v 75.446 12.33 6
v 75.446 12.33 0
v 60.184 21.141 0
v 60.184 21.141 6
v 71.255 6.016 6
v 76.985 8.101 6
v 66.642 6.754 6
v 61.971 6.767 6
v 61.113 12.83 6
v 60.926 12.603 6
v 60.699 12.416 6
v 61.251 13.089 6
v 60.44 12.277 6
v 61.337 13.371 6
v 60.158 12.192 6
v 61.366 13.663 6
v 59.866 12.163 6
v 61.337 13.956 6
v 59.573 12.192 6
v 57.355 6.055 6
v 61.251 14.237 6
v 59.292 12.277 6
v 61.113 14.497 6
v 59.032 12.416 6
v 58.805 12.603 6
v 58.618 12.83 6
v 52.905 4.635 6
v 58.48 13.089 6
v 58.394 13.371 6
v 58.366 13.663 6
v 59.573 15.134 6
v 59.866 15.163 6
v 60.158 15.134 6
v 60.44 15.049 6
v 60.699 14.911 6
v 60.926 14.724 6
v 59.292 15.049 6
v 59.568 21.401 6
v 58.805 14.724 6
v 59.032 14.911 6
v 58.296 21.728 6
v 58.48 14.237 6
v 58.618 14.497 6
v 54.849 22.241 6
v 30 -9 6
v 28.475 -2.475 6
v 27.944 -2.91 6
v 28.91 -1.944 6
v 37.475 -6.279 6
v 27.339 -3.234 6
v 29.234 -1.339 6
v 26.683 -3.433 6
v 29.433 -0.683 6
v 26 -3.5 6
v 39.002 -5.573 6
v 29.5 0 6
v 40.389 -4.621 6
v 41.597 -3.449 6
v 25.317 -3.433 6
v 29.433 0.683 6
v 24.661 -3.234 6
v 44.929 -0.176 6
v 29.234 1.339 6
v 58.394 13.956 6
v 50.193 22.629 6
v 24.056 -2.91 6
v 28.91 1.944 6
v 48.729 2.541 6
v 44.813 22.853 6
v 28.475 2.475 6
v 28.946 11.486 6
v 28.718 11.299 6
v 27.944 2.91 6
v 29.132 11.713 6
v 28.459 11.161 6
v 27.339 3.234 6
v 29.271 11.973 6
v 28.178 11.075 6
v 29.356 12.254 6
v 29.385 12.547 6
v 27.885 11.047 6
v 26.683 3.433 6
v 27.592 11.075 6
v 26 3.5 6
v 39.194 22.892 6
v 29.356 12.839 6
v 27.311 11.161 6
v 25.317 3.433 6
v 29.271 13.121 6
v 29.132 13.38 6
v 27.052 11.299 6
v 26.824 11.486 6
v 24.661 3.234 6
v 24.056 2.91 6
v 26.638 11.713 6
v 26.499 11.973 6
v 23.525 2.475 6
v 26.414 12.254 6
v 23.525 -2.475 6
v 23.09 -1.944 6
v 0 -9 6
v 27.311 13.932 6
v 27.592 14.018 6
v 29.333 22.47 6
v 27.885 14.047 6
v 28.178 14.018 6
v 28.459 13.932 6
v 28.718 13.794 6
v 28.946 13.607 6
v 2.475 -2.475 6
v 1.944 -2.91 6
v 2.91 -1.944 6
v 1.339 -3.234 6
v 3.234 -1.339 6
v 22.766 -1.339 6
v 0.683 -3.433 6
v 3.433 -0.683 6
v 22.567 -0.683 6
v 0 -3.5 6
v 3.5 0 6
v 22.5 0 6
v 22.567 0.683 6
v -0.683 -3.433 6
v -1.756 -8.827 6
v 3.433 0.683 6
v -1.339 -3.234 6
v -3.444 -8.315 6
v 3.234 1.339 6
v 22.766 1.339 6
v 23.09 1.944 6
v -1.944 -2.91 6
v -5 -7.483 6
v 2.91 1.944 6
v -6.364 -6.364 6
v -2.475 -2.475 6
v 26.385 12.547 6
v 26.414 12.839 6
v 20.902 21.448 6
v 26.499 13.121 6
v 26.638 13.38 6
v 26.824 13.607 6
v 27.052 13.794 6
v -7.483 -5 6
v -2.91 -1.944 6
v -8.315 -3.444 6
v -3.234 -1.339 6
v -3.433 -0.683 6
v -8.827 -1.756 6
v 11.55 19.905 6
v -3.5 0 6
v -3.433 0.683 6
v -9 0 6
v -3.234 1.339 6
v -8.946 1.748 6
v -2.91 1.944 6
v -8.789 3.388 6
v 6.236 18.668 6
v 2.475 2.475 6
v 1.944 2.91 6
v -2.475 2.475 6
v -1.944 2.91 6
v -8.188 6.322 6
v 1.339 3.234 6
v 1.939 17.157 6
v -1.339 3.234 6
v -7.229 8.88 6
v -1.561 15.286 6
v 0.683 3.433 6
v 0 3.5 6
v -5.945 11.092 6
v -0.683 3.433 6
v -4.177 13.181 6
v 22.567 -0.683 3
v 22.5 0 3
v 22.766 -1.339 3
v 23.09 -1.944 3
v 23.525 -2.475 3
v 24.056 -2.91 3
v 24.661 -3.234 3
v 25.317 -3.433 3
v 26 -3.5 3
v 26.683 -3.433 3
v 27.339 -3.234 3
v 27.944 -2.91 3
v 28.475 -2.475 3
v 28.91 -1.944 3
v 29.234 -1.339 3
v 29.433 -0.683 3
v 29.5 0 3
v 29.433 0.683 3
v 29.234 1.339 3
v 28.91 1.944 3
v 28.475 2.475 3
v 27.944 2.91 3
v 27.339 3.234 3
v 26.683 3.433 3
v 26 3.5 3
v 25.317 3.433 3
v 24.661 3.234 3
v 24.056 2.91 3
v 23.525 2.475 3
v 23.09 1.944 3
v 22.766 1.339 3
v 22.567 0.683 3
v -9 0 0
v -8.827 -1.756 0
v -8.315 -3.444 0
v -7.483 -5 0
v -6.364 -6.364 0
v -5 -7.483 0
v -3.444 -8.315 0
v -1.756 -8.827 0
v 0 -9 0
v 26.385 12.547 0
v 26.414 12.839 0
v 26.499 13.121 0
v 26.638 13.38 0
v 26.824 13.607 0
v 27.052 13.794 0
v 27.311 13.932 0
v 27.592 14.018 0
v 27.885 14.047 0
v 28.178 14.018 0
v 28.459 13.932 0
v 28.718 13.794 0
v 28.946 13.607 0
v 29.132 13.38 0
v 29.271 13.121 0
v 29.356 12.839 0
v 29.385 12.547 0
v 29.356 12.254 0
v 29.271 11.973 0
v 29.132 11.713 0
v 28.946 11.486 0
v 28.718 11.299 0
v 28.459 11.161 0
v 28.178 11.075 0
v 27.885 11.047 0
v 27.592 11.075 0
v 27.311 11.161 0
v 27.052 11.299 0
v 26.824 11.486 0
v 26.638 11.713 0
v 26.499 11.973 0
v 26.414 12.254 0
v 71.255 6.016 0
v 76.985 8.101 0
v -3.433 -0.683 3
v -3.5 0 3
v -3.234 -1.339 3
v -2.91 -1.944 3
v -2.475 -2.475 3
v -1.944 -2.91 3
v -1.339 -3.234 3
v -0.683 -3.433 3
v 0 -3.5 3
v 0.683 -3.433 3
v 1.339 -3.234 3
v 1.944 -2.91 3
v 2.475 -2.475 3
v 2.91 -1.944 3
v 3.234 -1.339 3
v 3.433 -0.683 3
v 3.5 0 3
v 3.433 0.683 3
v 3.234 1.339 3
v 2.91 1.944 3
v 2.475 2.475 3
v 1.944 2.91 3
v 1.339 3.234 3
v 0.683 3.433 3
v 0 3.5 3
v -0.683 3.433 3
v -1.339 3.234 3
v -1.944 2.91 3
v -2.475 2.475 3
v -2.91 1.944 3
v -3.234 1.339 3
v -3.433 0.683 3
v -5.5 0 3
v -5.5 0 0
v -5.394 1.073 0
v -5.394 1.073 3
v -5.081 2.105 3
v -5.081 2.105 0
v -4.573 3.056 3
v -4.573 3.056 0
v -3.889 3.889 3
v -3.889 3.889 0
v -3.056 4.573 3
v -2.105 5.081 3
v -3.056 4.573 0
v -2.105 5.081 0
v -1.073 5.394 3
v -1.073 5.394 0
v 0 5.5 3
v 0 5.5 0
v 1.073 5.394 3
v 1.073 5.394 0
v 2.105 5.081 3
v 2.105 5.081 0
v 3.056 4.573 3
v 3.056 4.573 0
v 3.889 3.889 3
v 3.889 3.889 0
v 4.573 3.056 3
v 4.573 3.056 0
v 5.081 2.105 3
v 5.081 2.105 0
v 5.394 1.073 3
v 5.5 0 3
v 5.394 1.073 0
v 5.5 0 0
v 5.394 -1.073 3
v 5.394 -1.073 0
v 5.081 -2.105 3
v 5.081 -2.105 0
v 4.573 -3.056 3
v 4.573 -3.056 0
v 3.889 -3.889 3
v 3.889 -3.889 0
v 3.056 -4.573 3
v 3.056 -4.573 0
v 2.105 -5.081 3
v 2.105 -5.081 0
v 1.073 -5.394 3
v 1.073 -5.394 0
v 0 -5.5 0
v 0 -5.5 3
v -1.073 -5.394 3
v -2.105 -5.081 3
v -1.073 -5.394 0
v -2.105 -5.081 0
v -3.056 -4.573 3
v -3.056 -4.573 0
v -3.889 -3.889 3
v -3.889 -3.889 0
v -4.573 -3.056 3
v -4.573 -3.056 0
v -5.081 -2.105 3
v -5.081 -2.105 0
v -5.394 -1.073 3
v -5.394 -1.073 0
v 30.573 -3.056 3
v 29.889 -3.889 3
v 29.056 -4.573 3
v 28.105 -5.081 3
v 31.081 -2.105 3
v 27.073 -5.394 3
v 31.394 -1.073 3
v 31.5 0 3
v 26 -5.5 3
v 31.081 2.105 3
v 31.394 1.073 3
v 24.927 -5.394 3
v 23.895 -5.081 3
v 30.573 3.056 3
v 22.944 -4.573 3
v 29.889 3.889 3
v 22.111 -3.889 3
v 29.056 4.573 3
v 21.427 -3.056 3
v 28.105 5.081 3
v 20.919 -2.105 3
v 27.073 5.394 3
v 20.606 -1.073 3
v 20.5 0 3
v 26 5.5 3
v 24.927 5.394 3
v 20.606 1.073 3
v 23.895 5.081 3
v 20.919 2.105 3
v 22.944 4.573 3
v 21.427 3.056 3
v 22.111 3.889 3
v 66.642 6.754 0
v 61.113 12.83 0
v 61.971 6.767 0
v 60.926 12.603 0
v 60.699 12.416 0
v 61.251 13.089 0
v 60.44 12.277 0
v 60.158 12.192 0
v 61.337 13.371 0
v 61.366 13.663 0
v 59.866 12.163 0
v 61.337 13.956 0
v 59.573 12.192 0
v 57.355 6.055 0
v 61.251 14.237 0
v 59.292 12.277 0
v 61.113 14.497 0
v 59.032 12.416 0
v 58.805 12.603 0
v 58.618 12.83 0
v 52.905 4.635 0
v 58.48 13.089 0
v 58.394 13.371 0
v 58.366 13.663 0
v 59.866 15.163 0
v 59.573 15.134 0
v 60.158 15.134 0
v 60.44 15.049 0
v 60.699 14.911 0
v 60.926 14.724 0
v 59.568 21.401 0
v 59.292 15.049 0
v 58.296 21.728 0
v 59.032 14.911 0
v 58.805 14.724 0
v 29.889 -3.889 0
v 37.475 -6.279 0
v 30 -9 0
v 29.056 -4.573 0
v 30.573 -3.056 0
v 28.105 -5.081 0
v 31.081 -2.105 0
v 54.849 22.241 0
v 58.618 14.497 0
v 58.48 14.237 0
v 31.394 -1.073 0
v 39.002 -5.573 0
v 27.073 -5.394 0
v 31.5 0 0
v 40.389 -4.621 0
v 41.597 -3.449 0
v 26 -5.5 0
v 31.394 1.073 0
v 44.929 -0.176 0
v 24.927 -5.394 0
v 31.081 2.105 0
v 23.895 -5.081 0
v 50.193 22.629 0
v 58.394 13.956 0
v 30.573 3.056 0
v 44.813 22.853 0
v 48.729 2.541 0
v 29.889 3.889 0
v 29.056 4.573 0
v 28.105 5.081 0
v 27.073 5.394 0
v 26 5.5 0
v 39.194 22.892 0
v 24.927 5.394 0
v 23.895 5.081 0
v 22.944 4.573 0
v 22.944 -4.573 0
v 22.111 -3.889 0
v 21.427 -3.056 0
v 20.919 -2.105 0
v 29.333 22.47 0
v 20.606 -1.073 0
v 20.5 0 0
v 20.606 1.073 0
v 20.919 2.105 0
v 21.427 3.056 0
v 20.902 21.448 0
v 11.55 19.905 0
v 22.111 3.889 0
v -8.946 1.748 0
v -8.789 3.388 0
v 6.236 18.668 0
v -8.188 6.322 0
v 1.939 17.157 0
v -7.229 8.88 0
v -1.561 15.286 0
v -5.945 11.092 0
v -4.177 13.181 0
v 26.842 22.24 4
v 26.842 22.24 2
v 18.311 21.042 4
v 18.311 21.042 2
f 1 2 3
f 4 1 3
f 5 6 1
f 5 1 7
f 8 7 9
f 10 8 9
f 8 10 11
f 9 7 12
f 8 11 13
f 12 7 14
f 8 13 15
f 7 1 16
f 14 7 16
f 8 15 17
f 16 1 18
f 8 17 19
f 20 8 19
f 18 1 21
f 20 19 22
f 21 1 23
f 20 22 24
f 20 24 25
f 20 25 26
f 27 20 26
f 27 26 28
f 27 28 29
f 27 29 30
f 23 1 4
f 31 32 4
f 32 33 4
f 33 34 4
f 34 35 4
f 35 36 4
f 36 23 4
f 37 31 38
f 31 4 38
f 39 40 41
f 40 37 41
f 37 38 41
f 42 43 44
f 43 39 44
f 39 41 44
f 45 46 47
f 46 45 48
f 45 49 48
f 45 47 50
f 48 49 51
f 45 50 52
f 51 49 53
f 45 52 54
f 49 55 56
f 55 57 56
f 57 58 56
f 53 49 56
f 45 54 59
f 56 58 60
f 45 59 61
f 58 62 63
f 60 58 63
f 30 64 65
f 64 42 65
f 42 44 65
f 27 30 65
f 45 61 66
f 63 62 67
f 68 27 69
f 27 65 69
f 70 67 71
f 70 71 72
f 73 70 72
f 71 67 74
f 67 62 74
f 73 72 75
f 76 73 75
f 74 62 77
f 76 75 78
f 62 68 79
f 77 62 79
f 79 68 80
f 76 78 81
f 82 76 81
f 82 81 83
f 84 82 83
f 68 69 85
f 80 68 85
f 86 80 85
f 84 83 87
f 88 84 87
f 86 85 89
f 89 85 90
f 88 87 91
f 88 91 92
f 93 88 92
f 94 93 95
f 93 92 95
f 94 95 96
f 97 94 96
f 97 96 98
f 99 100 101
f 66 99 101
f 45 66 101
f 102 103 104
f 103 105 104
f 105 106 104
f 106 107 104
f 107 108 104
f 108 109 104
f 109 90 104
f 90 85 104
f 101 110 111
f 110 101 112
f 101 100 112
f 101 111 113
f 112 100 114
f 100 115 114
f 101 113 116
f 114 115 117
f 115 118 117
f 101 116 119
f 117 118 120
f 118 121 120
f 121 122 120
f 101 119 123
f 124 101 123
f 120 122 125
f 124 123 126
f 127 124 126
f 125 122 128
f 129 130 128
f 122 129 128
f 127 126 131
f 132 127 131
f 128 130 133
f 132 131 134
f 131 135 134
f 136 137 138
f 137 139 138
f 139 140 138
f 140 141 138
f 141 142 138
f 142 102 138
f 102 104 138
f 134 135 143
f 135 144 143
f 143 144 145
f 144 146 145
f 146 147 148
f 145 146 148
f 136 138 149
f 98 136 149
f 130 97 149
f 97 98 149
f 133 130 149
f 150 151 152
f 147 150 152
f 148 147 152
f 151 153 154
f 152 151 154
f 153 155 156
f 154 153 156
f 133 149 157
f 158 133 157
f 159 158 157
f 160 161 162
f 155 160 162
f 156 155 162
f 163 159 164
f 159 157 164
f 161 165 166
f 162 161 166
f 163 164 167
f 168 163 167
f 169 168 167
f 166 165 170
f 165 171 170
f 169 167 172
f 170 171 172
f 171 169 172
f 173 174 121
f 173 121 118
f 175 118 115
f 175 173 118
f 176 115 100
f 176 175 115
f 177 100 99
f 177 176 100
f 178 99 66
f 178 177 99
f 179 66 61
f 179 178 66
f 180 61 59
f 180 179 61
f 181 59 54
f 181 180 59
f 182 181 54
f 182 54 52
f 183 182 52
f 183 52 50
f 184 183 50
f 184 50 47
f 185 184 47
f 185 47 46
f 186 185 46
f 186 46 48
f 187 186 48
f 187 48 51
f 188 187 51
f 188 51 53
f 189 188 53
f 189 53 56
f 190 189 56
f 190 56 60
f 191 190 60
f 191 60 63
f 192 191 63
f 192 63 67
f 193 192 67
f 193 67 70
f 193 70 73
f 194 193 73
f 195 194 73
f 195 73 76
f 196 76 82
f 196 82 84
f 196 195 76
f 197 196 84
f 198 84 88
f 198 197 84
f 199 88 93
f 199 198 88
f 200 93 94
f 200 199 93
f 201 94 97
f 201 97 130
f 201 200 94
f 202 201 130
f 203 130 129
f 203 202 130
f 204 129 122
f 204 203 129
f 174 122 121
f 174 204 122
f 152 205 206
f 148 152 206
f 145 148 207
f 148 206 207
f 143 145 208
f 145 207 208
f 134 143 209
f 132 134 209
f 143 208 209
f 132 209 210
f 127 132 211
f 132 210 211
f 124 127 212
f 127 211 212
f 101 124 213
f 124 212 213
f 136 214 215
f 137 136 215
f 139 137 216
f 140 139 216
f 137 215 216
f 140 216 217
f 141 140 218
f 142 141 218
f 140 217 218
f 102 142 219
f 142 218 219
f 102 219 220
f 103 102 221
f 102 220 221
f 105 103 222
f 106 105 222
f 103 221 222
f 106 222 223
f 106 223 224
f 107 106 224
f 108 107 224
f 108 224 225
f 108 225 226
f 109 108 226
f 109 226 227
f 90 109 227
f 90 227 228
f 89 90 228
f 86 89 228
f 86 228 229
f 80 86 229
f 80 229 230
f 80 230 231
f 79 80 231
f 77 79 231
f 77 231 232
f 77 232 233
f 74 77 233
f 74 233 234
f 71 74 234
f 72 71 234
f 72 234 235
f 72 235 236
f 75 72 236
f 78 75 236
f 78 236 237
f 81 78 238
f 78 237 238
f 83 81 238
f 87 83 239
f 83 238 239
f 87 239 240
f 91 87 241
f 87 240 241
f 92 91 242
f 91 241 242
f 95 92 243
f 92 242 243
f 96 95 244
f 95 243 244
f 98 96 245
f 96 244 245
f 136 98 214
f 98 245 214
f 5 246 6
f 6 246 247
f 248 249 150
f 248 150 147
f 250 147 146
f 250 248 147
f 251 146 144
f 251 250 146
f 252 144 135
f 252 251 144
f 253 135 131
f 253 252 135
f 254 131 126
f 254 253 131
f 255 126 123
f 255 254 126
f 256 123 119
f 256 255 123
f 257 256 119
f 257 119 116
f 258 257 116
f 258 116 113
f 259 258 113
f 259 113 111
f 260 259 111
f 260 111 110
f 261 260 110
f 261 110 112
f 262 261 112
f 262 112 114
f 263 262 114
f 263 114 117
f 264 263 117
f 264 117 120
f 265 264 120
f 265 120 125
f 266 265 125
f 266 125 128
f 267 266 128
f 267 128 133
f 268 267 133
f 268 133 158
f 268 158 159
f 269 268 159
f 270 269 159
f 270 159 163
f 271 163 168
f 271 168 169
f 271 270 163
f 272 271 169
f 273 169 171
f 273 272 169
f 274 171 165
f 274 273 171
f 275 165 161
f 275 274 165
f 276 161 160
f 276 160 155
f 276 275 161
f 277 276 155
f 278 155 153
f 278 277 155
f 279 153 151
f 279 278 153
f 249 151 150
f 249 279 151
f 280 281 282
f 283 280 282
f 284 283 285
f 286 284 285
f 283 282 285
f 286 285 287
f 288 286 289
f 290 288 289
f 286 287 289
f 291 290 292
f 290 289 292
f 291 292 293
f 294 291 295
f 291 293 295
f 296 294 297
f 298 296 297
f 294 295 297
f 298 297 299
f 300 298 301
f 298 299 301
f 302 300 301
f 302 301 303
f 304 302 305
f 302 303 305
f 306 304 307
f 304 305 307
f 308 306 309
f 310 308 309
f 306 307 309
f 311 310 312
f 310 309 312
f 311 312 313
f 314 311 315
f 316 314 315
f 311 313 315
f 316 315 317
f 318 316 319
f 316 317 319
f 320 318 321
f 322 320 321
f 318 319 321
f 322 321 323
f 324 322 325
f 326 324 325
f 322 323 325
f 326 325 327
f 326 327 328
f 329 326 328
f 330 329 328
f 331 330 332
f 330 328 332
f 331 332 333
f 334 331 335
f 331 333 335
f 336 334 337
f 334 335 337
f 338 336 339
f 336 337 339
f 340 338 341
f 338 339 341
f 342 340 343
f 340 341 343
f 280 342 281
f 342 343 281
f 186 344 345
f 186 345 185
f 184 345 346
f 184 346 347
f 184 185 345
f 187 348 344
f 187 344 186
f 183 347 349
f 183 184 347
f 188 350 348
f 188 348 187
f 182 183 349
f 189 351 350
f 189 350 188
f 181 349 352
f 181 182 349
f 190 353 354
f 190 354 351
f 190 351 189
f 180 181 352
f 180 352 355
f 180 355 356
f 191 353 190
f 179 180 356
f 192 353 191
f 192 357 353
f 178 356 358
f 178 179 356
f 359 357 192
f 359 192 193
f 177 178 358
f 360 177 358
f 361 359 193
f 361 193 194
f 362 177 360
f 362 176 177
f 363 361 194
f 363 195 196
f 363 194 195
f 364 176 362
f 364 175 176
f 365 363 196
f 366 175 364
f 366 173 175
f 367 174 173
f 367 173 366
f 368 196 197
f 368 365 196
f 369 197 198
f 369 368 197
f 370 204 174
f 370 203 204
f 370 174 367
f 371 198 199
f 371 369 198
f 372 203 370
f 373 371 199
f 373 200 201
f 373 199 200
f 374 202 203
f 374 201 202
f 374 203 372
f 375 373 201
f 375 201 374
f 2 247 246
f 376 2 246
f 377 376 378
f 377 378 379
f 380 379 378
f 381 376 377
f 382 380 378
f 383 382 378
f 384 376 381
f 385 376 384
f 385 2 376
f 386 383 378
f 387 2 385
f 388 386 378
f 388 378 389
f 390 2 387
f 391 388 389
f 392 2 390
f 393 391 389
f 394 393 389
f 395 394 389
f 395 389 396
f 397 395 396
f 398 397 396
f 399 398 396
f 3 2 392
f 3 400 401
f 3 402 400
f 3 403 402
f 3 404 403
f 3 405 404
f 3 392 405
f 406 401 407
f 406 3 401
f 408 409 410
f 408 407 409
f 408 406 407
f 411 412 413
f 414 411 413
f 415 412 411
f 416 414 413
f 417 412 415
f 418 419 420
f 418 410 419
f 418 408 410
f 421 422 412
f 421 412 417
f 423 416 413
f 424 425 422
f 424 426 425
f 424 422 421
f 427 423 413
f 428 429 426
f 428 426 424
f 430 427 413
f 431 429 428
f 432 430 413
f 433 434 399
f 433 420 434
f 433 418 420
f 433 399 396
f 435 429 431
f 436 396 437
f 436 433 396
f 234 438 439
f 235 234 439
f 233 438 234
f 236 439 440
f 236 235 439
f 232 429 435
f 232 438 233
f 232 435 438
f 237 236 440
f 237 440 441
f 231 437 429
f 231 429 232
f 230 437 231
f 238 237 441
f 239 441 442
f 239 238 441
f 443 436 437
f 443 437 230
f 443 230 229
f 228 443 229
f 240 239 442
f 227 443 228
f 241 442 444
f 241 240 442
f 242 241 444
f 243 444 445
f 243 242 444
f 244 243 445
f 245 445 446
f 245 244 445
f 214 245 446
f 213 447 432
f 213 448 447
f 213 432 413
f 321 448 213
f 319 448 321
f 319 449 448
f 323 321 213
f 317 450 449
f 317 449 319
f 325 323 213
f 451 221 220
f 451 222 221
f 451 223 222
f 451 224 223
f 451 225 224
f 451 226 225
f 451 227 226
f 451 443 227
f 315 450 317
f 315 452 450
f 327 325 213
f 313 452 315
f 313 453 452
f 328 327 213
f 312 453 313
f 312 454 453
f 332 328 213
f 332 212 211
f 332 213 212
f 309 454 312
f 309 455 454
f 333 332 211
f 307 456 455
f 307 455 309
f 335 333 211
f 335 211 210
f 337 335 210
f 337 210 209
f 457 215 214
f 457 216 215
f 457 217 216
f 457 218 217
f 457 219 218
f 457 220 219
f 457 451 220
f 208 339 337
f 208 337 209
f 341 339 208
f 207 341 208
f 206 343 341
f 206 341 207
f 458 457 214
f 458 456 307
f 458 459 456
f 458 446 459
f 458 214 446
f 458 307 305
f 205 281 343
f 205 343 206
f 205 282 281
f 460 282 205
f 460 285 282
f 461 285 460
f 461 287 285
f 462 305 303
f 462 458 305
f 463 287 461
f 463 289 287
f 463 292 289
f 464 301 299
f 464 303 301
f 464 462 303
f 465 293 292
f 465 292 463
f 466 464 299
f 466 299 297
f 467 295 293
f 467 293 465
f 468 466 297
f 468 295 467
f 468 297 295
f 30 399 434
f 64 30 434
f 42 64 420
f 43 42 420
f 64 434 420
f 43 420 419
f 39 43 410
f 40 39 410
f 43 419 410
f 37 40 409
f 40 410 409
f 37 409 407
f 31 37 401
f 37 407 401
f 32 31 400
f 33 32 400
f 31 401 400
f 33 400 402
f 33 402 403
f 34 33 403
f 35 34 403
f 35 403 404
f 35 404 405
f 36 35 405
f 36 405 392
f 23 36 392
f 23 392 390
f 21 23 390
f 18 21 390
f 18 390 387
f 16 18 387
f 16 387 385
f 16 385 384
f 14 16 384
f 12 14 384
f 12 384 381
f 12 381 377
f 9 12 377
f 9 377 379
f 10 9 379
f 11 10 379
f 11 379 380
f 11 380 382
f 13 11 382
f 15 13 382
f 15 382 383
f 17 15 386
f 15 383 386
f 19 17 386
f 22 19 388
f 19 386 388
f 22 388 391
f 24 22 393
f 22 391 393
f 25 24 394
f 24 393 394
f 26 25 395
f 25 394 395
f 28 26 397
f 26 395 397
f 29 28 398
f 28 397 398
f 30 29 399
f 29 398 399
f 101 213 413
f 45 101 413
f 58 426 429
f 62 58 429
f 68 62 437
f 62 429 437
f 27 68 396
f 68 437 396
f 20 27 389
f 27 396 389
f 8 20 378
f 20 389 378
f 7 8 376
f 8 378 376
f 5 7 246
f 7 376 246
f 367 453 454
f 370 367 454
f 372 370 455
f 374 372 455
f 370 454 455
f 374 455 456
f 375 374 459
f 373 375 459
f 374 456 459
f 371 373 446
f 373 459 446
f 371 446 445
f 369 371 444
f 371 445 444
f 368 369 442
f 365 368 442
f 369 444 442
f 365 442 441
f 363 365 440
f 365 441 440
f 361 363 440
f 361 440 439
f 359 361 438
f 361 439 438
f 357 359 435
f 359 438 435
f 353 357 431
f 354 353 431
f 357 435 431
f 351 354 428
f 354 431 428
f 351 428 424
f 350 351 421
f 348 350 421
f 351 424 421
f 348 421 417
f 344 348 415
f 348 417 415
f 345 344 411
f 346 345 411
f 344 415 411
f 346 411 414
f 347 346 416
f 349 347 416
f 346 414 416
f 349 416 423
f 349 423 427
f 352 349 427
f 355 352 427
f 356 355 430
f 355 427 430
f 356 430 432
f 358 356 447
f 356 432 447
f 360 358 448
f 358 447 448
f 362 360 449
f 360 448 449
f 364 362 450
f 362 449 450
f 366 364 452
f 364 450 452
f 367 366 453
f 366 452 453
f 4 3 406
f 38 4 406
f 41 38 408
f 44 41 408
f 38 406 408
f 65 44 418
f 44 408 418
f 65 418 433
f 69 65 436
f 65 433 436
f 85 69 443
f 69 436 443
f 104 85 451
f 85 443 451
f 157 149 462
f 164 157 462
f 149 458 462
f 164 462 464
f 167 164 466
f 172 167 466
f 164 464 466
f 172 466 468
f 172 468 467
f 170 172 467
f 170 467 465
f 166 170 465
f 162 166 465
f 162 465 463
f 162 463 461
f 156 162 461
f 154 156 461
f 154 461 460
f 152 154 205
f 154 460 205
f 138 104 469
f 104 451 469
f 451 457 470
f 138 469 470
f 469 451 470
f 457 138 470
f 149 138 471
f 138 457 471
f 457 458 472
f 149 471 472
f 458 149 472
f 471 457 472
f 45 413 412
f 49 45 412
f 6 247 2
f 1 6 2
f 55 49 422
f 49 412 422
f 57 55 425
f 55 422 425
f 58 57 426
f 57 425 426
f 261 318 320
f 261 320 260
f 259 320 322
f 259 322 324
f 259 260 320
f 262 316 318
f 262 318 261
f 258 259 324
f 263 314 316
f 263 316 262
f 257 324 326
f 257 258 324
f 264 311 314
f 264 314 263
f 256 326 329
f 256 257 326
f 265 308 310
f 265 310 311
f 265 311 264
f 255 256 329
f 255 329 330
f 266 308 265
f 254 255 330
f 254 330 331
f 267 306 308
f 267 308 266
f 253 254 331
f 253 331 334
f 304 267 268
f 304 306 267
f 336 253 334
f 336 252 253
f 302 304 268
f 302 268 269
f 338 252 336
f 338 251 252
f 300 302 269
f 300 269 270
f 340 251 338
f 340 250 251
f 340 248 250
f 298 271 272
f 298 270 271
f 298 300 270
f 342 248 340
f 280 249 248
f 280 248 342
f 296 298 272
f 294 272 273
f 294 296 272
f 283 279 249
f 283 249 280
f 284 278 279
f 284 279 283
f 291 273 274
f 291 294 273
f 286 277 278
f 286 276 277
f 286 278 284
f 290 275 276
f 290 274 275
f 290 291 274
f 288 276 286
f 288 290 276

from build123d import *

# Parameters (mm, degrees)
SKETCH1_R           = 3.5
EXTRUSION1_DEPTH    = 6
SKETCH3_R           = 30
EXTRUSION3_DEPTH    = 10
FILLET2_R           = 10
BOSS_EXTRUDE1_DEPTH = 6
SKETCH8_R           = 1.5
CUT_EXTRUDE1_DEPTH  = 14
SKETCH7_R           = 5.5
CUT_EXTRUDE2_DEPTH  = 3


with BuildPart() as part:
    # Sketch1 → Extrusion1 (new body)
    with BuildSketch(Plane.XY):
        with BuildLine():
            Line((0, -9), (30, -9))
            Line((30, -9), (76.984631039, 8.101007166))
            Line((76.984631039, 8.101007166), (75.445540394, 12.32962396))
            Line((75.445540394, 12.32962396), (60.183576084, 21.141123163))
            Line((60.183576084, 21.141123163), (26.826114347, 9))
            Line((26.826114347, 9), (0, 9))
            ThreePointArc((0, 9), (-9, 0), (0, -9))
        make_face()
        with Locations(Location((0, 0, 0), (0, 0, 180))):
            Circle(SKETCH1_R, mode=Mode.SUBTRACT)
        with Locations(Location((26, 0, 0), (0, 0, 180))):
            Circle(SKETCH1_R, mode=Mode.SUBTRACT)
    extrude(amount=EXTRUSION1_DEPTH)

    # Sketch3 → Extrusion3 (cut)
    with BuildSketch(Plane(origin=(0, 0, 0), x_dir=(-1, 0, 0), z_dir=(0, 0, -1))):
        with Locations((-64.222352322, -23.14852672)):
            Circle(SKETCH3_R)
    extrude(amount=-EXTRUSION3_DEPTH, mode=Mode.SUBTRACT)

    # Fillet2
    fillet2_edges = [part.edges().sort_by_distance(p)[0] for p in [
        (40.088809532, -5.327973631, 3),
    ]]
    fillet(fillet2_edges, radius=FILLET2_R)

    # Sketch6 → Boss-Extrude1 (add)
    with BuildSketch(Plane(origin=(0, 0, 0), x_dir=(-1, 0, 0), z_dir=(0, 0, -1))):
        with BuildLine():
            ThreePointArc((0, 9), (6.363961031, 6.363961031), (9, 0))
            add(Edge.make_bspline(
                [(-60.183576084, 21.141123163), (-57.582994943, 22.642569384), (-35.785366448, 23.838648882), (-8.377062942, 19.440019234), (9, 16.91404675), (9, 0)],
                knots=[0, 0, 0, 0, 0.435384133, 0.535384133, 1, 1, 1, 1], degree=3))
            Line((-60.183576084, 21.141123163), (-26.826114347, 9))
            Line((-26.826114347, 9), (0, 9))
        make_face()
    extrude(amount=-BOSS_EXTRUDE1_DEPTH)

    # Sketch8 → Cut-Extrude1 (cut)
    with BuildSketch(Plane(origin=(0, 0, 0), x_dir=(-1, 0, 0), z_dir=(0, 0, -1))):
        with Locations((-59.865613746, 13.663313065)):
            Circle(SKETCH8_R)
        with Locations((-27.885107281, 12.546529171)):
            Circle(SKETCH8_R)
    extrude(amount=-CUT_EXTRUDE1_DEPTH, mode=Mode.SUBTRACT)

    # Sketch7 → Cut-Extrude2 (cut)
    with BuildSketch(Plane(origin=(0, 0, 0), x_dir=(-1, 0, 0), z_dir=(0, 0, -1))):
        Circle(SKETCH7_R)
        with Locations((-26, 0)):
            Circle(SKETCH7_R)
    extrude(amount=-CUT_EXTRUDE2_DEPTH, mode=Mode.SUBTRACT)


solid = part.part
